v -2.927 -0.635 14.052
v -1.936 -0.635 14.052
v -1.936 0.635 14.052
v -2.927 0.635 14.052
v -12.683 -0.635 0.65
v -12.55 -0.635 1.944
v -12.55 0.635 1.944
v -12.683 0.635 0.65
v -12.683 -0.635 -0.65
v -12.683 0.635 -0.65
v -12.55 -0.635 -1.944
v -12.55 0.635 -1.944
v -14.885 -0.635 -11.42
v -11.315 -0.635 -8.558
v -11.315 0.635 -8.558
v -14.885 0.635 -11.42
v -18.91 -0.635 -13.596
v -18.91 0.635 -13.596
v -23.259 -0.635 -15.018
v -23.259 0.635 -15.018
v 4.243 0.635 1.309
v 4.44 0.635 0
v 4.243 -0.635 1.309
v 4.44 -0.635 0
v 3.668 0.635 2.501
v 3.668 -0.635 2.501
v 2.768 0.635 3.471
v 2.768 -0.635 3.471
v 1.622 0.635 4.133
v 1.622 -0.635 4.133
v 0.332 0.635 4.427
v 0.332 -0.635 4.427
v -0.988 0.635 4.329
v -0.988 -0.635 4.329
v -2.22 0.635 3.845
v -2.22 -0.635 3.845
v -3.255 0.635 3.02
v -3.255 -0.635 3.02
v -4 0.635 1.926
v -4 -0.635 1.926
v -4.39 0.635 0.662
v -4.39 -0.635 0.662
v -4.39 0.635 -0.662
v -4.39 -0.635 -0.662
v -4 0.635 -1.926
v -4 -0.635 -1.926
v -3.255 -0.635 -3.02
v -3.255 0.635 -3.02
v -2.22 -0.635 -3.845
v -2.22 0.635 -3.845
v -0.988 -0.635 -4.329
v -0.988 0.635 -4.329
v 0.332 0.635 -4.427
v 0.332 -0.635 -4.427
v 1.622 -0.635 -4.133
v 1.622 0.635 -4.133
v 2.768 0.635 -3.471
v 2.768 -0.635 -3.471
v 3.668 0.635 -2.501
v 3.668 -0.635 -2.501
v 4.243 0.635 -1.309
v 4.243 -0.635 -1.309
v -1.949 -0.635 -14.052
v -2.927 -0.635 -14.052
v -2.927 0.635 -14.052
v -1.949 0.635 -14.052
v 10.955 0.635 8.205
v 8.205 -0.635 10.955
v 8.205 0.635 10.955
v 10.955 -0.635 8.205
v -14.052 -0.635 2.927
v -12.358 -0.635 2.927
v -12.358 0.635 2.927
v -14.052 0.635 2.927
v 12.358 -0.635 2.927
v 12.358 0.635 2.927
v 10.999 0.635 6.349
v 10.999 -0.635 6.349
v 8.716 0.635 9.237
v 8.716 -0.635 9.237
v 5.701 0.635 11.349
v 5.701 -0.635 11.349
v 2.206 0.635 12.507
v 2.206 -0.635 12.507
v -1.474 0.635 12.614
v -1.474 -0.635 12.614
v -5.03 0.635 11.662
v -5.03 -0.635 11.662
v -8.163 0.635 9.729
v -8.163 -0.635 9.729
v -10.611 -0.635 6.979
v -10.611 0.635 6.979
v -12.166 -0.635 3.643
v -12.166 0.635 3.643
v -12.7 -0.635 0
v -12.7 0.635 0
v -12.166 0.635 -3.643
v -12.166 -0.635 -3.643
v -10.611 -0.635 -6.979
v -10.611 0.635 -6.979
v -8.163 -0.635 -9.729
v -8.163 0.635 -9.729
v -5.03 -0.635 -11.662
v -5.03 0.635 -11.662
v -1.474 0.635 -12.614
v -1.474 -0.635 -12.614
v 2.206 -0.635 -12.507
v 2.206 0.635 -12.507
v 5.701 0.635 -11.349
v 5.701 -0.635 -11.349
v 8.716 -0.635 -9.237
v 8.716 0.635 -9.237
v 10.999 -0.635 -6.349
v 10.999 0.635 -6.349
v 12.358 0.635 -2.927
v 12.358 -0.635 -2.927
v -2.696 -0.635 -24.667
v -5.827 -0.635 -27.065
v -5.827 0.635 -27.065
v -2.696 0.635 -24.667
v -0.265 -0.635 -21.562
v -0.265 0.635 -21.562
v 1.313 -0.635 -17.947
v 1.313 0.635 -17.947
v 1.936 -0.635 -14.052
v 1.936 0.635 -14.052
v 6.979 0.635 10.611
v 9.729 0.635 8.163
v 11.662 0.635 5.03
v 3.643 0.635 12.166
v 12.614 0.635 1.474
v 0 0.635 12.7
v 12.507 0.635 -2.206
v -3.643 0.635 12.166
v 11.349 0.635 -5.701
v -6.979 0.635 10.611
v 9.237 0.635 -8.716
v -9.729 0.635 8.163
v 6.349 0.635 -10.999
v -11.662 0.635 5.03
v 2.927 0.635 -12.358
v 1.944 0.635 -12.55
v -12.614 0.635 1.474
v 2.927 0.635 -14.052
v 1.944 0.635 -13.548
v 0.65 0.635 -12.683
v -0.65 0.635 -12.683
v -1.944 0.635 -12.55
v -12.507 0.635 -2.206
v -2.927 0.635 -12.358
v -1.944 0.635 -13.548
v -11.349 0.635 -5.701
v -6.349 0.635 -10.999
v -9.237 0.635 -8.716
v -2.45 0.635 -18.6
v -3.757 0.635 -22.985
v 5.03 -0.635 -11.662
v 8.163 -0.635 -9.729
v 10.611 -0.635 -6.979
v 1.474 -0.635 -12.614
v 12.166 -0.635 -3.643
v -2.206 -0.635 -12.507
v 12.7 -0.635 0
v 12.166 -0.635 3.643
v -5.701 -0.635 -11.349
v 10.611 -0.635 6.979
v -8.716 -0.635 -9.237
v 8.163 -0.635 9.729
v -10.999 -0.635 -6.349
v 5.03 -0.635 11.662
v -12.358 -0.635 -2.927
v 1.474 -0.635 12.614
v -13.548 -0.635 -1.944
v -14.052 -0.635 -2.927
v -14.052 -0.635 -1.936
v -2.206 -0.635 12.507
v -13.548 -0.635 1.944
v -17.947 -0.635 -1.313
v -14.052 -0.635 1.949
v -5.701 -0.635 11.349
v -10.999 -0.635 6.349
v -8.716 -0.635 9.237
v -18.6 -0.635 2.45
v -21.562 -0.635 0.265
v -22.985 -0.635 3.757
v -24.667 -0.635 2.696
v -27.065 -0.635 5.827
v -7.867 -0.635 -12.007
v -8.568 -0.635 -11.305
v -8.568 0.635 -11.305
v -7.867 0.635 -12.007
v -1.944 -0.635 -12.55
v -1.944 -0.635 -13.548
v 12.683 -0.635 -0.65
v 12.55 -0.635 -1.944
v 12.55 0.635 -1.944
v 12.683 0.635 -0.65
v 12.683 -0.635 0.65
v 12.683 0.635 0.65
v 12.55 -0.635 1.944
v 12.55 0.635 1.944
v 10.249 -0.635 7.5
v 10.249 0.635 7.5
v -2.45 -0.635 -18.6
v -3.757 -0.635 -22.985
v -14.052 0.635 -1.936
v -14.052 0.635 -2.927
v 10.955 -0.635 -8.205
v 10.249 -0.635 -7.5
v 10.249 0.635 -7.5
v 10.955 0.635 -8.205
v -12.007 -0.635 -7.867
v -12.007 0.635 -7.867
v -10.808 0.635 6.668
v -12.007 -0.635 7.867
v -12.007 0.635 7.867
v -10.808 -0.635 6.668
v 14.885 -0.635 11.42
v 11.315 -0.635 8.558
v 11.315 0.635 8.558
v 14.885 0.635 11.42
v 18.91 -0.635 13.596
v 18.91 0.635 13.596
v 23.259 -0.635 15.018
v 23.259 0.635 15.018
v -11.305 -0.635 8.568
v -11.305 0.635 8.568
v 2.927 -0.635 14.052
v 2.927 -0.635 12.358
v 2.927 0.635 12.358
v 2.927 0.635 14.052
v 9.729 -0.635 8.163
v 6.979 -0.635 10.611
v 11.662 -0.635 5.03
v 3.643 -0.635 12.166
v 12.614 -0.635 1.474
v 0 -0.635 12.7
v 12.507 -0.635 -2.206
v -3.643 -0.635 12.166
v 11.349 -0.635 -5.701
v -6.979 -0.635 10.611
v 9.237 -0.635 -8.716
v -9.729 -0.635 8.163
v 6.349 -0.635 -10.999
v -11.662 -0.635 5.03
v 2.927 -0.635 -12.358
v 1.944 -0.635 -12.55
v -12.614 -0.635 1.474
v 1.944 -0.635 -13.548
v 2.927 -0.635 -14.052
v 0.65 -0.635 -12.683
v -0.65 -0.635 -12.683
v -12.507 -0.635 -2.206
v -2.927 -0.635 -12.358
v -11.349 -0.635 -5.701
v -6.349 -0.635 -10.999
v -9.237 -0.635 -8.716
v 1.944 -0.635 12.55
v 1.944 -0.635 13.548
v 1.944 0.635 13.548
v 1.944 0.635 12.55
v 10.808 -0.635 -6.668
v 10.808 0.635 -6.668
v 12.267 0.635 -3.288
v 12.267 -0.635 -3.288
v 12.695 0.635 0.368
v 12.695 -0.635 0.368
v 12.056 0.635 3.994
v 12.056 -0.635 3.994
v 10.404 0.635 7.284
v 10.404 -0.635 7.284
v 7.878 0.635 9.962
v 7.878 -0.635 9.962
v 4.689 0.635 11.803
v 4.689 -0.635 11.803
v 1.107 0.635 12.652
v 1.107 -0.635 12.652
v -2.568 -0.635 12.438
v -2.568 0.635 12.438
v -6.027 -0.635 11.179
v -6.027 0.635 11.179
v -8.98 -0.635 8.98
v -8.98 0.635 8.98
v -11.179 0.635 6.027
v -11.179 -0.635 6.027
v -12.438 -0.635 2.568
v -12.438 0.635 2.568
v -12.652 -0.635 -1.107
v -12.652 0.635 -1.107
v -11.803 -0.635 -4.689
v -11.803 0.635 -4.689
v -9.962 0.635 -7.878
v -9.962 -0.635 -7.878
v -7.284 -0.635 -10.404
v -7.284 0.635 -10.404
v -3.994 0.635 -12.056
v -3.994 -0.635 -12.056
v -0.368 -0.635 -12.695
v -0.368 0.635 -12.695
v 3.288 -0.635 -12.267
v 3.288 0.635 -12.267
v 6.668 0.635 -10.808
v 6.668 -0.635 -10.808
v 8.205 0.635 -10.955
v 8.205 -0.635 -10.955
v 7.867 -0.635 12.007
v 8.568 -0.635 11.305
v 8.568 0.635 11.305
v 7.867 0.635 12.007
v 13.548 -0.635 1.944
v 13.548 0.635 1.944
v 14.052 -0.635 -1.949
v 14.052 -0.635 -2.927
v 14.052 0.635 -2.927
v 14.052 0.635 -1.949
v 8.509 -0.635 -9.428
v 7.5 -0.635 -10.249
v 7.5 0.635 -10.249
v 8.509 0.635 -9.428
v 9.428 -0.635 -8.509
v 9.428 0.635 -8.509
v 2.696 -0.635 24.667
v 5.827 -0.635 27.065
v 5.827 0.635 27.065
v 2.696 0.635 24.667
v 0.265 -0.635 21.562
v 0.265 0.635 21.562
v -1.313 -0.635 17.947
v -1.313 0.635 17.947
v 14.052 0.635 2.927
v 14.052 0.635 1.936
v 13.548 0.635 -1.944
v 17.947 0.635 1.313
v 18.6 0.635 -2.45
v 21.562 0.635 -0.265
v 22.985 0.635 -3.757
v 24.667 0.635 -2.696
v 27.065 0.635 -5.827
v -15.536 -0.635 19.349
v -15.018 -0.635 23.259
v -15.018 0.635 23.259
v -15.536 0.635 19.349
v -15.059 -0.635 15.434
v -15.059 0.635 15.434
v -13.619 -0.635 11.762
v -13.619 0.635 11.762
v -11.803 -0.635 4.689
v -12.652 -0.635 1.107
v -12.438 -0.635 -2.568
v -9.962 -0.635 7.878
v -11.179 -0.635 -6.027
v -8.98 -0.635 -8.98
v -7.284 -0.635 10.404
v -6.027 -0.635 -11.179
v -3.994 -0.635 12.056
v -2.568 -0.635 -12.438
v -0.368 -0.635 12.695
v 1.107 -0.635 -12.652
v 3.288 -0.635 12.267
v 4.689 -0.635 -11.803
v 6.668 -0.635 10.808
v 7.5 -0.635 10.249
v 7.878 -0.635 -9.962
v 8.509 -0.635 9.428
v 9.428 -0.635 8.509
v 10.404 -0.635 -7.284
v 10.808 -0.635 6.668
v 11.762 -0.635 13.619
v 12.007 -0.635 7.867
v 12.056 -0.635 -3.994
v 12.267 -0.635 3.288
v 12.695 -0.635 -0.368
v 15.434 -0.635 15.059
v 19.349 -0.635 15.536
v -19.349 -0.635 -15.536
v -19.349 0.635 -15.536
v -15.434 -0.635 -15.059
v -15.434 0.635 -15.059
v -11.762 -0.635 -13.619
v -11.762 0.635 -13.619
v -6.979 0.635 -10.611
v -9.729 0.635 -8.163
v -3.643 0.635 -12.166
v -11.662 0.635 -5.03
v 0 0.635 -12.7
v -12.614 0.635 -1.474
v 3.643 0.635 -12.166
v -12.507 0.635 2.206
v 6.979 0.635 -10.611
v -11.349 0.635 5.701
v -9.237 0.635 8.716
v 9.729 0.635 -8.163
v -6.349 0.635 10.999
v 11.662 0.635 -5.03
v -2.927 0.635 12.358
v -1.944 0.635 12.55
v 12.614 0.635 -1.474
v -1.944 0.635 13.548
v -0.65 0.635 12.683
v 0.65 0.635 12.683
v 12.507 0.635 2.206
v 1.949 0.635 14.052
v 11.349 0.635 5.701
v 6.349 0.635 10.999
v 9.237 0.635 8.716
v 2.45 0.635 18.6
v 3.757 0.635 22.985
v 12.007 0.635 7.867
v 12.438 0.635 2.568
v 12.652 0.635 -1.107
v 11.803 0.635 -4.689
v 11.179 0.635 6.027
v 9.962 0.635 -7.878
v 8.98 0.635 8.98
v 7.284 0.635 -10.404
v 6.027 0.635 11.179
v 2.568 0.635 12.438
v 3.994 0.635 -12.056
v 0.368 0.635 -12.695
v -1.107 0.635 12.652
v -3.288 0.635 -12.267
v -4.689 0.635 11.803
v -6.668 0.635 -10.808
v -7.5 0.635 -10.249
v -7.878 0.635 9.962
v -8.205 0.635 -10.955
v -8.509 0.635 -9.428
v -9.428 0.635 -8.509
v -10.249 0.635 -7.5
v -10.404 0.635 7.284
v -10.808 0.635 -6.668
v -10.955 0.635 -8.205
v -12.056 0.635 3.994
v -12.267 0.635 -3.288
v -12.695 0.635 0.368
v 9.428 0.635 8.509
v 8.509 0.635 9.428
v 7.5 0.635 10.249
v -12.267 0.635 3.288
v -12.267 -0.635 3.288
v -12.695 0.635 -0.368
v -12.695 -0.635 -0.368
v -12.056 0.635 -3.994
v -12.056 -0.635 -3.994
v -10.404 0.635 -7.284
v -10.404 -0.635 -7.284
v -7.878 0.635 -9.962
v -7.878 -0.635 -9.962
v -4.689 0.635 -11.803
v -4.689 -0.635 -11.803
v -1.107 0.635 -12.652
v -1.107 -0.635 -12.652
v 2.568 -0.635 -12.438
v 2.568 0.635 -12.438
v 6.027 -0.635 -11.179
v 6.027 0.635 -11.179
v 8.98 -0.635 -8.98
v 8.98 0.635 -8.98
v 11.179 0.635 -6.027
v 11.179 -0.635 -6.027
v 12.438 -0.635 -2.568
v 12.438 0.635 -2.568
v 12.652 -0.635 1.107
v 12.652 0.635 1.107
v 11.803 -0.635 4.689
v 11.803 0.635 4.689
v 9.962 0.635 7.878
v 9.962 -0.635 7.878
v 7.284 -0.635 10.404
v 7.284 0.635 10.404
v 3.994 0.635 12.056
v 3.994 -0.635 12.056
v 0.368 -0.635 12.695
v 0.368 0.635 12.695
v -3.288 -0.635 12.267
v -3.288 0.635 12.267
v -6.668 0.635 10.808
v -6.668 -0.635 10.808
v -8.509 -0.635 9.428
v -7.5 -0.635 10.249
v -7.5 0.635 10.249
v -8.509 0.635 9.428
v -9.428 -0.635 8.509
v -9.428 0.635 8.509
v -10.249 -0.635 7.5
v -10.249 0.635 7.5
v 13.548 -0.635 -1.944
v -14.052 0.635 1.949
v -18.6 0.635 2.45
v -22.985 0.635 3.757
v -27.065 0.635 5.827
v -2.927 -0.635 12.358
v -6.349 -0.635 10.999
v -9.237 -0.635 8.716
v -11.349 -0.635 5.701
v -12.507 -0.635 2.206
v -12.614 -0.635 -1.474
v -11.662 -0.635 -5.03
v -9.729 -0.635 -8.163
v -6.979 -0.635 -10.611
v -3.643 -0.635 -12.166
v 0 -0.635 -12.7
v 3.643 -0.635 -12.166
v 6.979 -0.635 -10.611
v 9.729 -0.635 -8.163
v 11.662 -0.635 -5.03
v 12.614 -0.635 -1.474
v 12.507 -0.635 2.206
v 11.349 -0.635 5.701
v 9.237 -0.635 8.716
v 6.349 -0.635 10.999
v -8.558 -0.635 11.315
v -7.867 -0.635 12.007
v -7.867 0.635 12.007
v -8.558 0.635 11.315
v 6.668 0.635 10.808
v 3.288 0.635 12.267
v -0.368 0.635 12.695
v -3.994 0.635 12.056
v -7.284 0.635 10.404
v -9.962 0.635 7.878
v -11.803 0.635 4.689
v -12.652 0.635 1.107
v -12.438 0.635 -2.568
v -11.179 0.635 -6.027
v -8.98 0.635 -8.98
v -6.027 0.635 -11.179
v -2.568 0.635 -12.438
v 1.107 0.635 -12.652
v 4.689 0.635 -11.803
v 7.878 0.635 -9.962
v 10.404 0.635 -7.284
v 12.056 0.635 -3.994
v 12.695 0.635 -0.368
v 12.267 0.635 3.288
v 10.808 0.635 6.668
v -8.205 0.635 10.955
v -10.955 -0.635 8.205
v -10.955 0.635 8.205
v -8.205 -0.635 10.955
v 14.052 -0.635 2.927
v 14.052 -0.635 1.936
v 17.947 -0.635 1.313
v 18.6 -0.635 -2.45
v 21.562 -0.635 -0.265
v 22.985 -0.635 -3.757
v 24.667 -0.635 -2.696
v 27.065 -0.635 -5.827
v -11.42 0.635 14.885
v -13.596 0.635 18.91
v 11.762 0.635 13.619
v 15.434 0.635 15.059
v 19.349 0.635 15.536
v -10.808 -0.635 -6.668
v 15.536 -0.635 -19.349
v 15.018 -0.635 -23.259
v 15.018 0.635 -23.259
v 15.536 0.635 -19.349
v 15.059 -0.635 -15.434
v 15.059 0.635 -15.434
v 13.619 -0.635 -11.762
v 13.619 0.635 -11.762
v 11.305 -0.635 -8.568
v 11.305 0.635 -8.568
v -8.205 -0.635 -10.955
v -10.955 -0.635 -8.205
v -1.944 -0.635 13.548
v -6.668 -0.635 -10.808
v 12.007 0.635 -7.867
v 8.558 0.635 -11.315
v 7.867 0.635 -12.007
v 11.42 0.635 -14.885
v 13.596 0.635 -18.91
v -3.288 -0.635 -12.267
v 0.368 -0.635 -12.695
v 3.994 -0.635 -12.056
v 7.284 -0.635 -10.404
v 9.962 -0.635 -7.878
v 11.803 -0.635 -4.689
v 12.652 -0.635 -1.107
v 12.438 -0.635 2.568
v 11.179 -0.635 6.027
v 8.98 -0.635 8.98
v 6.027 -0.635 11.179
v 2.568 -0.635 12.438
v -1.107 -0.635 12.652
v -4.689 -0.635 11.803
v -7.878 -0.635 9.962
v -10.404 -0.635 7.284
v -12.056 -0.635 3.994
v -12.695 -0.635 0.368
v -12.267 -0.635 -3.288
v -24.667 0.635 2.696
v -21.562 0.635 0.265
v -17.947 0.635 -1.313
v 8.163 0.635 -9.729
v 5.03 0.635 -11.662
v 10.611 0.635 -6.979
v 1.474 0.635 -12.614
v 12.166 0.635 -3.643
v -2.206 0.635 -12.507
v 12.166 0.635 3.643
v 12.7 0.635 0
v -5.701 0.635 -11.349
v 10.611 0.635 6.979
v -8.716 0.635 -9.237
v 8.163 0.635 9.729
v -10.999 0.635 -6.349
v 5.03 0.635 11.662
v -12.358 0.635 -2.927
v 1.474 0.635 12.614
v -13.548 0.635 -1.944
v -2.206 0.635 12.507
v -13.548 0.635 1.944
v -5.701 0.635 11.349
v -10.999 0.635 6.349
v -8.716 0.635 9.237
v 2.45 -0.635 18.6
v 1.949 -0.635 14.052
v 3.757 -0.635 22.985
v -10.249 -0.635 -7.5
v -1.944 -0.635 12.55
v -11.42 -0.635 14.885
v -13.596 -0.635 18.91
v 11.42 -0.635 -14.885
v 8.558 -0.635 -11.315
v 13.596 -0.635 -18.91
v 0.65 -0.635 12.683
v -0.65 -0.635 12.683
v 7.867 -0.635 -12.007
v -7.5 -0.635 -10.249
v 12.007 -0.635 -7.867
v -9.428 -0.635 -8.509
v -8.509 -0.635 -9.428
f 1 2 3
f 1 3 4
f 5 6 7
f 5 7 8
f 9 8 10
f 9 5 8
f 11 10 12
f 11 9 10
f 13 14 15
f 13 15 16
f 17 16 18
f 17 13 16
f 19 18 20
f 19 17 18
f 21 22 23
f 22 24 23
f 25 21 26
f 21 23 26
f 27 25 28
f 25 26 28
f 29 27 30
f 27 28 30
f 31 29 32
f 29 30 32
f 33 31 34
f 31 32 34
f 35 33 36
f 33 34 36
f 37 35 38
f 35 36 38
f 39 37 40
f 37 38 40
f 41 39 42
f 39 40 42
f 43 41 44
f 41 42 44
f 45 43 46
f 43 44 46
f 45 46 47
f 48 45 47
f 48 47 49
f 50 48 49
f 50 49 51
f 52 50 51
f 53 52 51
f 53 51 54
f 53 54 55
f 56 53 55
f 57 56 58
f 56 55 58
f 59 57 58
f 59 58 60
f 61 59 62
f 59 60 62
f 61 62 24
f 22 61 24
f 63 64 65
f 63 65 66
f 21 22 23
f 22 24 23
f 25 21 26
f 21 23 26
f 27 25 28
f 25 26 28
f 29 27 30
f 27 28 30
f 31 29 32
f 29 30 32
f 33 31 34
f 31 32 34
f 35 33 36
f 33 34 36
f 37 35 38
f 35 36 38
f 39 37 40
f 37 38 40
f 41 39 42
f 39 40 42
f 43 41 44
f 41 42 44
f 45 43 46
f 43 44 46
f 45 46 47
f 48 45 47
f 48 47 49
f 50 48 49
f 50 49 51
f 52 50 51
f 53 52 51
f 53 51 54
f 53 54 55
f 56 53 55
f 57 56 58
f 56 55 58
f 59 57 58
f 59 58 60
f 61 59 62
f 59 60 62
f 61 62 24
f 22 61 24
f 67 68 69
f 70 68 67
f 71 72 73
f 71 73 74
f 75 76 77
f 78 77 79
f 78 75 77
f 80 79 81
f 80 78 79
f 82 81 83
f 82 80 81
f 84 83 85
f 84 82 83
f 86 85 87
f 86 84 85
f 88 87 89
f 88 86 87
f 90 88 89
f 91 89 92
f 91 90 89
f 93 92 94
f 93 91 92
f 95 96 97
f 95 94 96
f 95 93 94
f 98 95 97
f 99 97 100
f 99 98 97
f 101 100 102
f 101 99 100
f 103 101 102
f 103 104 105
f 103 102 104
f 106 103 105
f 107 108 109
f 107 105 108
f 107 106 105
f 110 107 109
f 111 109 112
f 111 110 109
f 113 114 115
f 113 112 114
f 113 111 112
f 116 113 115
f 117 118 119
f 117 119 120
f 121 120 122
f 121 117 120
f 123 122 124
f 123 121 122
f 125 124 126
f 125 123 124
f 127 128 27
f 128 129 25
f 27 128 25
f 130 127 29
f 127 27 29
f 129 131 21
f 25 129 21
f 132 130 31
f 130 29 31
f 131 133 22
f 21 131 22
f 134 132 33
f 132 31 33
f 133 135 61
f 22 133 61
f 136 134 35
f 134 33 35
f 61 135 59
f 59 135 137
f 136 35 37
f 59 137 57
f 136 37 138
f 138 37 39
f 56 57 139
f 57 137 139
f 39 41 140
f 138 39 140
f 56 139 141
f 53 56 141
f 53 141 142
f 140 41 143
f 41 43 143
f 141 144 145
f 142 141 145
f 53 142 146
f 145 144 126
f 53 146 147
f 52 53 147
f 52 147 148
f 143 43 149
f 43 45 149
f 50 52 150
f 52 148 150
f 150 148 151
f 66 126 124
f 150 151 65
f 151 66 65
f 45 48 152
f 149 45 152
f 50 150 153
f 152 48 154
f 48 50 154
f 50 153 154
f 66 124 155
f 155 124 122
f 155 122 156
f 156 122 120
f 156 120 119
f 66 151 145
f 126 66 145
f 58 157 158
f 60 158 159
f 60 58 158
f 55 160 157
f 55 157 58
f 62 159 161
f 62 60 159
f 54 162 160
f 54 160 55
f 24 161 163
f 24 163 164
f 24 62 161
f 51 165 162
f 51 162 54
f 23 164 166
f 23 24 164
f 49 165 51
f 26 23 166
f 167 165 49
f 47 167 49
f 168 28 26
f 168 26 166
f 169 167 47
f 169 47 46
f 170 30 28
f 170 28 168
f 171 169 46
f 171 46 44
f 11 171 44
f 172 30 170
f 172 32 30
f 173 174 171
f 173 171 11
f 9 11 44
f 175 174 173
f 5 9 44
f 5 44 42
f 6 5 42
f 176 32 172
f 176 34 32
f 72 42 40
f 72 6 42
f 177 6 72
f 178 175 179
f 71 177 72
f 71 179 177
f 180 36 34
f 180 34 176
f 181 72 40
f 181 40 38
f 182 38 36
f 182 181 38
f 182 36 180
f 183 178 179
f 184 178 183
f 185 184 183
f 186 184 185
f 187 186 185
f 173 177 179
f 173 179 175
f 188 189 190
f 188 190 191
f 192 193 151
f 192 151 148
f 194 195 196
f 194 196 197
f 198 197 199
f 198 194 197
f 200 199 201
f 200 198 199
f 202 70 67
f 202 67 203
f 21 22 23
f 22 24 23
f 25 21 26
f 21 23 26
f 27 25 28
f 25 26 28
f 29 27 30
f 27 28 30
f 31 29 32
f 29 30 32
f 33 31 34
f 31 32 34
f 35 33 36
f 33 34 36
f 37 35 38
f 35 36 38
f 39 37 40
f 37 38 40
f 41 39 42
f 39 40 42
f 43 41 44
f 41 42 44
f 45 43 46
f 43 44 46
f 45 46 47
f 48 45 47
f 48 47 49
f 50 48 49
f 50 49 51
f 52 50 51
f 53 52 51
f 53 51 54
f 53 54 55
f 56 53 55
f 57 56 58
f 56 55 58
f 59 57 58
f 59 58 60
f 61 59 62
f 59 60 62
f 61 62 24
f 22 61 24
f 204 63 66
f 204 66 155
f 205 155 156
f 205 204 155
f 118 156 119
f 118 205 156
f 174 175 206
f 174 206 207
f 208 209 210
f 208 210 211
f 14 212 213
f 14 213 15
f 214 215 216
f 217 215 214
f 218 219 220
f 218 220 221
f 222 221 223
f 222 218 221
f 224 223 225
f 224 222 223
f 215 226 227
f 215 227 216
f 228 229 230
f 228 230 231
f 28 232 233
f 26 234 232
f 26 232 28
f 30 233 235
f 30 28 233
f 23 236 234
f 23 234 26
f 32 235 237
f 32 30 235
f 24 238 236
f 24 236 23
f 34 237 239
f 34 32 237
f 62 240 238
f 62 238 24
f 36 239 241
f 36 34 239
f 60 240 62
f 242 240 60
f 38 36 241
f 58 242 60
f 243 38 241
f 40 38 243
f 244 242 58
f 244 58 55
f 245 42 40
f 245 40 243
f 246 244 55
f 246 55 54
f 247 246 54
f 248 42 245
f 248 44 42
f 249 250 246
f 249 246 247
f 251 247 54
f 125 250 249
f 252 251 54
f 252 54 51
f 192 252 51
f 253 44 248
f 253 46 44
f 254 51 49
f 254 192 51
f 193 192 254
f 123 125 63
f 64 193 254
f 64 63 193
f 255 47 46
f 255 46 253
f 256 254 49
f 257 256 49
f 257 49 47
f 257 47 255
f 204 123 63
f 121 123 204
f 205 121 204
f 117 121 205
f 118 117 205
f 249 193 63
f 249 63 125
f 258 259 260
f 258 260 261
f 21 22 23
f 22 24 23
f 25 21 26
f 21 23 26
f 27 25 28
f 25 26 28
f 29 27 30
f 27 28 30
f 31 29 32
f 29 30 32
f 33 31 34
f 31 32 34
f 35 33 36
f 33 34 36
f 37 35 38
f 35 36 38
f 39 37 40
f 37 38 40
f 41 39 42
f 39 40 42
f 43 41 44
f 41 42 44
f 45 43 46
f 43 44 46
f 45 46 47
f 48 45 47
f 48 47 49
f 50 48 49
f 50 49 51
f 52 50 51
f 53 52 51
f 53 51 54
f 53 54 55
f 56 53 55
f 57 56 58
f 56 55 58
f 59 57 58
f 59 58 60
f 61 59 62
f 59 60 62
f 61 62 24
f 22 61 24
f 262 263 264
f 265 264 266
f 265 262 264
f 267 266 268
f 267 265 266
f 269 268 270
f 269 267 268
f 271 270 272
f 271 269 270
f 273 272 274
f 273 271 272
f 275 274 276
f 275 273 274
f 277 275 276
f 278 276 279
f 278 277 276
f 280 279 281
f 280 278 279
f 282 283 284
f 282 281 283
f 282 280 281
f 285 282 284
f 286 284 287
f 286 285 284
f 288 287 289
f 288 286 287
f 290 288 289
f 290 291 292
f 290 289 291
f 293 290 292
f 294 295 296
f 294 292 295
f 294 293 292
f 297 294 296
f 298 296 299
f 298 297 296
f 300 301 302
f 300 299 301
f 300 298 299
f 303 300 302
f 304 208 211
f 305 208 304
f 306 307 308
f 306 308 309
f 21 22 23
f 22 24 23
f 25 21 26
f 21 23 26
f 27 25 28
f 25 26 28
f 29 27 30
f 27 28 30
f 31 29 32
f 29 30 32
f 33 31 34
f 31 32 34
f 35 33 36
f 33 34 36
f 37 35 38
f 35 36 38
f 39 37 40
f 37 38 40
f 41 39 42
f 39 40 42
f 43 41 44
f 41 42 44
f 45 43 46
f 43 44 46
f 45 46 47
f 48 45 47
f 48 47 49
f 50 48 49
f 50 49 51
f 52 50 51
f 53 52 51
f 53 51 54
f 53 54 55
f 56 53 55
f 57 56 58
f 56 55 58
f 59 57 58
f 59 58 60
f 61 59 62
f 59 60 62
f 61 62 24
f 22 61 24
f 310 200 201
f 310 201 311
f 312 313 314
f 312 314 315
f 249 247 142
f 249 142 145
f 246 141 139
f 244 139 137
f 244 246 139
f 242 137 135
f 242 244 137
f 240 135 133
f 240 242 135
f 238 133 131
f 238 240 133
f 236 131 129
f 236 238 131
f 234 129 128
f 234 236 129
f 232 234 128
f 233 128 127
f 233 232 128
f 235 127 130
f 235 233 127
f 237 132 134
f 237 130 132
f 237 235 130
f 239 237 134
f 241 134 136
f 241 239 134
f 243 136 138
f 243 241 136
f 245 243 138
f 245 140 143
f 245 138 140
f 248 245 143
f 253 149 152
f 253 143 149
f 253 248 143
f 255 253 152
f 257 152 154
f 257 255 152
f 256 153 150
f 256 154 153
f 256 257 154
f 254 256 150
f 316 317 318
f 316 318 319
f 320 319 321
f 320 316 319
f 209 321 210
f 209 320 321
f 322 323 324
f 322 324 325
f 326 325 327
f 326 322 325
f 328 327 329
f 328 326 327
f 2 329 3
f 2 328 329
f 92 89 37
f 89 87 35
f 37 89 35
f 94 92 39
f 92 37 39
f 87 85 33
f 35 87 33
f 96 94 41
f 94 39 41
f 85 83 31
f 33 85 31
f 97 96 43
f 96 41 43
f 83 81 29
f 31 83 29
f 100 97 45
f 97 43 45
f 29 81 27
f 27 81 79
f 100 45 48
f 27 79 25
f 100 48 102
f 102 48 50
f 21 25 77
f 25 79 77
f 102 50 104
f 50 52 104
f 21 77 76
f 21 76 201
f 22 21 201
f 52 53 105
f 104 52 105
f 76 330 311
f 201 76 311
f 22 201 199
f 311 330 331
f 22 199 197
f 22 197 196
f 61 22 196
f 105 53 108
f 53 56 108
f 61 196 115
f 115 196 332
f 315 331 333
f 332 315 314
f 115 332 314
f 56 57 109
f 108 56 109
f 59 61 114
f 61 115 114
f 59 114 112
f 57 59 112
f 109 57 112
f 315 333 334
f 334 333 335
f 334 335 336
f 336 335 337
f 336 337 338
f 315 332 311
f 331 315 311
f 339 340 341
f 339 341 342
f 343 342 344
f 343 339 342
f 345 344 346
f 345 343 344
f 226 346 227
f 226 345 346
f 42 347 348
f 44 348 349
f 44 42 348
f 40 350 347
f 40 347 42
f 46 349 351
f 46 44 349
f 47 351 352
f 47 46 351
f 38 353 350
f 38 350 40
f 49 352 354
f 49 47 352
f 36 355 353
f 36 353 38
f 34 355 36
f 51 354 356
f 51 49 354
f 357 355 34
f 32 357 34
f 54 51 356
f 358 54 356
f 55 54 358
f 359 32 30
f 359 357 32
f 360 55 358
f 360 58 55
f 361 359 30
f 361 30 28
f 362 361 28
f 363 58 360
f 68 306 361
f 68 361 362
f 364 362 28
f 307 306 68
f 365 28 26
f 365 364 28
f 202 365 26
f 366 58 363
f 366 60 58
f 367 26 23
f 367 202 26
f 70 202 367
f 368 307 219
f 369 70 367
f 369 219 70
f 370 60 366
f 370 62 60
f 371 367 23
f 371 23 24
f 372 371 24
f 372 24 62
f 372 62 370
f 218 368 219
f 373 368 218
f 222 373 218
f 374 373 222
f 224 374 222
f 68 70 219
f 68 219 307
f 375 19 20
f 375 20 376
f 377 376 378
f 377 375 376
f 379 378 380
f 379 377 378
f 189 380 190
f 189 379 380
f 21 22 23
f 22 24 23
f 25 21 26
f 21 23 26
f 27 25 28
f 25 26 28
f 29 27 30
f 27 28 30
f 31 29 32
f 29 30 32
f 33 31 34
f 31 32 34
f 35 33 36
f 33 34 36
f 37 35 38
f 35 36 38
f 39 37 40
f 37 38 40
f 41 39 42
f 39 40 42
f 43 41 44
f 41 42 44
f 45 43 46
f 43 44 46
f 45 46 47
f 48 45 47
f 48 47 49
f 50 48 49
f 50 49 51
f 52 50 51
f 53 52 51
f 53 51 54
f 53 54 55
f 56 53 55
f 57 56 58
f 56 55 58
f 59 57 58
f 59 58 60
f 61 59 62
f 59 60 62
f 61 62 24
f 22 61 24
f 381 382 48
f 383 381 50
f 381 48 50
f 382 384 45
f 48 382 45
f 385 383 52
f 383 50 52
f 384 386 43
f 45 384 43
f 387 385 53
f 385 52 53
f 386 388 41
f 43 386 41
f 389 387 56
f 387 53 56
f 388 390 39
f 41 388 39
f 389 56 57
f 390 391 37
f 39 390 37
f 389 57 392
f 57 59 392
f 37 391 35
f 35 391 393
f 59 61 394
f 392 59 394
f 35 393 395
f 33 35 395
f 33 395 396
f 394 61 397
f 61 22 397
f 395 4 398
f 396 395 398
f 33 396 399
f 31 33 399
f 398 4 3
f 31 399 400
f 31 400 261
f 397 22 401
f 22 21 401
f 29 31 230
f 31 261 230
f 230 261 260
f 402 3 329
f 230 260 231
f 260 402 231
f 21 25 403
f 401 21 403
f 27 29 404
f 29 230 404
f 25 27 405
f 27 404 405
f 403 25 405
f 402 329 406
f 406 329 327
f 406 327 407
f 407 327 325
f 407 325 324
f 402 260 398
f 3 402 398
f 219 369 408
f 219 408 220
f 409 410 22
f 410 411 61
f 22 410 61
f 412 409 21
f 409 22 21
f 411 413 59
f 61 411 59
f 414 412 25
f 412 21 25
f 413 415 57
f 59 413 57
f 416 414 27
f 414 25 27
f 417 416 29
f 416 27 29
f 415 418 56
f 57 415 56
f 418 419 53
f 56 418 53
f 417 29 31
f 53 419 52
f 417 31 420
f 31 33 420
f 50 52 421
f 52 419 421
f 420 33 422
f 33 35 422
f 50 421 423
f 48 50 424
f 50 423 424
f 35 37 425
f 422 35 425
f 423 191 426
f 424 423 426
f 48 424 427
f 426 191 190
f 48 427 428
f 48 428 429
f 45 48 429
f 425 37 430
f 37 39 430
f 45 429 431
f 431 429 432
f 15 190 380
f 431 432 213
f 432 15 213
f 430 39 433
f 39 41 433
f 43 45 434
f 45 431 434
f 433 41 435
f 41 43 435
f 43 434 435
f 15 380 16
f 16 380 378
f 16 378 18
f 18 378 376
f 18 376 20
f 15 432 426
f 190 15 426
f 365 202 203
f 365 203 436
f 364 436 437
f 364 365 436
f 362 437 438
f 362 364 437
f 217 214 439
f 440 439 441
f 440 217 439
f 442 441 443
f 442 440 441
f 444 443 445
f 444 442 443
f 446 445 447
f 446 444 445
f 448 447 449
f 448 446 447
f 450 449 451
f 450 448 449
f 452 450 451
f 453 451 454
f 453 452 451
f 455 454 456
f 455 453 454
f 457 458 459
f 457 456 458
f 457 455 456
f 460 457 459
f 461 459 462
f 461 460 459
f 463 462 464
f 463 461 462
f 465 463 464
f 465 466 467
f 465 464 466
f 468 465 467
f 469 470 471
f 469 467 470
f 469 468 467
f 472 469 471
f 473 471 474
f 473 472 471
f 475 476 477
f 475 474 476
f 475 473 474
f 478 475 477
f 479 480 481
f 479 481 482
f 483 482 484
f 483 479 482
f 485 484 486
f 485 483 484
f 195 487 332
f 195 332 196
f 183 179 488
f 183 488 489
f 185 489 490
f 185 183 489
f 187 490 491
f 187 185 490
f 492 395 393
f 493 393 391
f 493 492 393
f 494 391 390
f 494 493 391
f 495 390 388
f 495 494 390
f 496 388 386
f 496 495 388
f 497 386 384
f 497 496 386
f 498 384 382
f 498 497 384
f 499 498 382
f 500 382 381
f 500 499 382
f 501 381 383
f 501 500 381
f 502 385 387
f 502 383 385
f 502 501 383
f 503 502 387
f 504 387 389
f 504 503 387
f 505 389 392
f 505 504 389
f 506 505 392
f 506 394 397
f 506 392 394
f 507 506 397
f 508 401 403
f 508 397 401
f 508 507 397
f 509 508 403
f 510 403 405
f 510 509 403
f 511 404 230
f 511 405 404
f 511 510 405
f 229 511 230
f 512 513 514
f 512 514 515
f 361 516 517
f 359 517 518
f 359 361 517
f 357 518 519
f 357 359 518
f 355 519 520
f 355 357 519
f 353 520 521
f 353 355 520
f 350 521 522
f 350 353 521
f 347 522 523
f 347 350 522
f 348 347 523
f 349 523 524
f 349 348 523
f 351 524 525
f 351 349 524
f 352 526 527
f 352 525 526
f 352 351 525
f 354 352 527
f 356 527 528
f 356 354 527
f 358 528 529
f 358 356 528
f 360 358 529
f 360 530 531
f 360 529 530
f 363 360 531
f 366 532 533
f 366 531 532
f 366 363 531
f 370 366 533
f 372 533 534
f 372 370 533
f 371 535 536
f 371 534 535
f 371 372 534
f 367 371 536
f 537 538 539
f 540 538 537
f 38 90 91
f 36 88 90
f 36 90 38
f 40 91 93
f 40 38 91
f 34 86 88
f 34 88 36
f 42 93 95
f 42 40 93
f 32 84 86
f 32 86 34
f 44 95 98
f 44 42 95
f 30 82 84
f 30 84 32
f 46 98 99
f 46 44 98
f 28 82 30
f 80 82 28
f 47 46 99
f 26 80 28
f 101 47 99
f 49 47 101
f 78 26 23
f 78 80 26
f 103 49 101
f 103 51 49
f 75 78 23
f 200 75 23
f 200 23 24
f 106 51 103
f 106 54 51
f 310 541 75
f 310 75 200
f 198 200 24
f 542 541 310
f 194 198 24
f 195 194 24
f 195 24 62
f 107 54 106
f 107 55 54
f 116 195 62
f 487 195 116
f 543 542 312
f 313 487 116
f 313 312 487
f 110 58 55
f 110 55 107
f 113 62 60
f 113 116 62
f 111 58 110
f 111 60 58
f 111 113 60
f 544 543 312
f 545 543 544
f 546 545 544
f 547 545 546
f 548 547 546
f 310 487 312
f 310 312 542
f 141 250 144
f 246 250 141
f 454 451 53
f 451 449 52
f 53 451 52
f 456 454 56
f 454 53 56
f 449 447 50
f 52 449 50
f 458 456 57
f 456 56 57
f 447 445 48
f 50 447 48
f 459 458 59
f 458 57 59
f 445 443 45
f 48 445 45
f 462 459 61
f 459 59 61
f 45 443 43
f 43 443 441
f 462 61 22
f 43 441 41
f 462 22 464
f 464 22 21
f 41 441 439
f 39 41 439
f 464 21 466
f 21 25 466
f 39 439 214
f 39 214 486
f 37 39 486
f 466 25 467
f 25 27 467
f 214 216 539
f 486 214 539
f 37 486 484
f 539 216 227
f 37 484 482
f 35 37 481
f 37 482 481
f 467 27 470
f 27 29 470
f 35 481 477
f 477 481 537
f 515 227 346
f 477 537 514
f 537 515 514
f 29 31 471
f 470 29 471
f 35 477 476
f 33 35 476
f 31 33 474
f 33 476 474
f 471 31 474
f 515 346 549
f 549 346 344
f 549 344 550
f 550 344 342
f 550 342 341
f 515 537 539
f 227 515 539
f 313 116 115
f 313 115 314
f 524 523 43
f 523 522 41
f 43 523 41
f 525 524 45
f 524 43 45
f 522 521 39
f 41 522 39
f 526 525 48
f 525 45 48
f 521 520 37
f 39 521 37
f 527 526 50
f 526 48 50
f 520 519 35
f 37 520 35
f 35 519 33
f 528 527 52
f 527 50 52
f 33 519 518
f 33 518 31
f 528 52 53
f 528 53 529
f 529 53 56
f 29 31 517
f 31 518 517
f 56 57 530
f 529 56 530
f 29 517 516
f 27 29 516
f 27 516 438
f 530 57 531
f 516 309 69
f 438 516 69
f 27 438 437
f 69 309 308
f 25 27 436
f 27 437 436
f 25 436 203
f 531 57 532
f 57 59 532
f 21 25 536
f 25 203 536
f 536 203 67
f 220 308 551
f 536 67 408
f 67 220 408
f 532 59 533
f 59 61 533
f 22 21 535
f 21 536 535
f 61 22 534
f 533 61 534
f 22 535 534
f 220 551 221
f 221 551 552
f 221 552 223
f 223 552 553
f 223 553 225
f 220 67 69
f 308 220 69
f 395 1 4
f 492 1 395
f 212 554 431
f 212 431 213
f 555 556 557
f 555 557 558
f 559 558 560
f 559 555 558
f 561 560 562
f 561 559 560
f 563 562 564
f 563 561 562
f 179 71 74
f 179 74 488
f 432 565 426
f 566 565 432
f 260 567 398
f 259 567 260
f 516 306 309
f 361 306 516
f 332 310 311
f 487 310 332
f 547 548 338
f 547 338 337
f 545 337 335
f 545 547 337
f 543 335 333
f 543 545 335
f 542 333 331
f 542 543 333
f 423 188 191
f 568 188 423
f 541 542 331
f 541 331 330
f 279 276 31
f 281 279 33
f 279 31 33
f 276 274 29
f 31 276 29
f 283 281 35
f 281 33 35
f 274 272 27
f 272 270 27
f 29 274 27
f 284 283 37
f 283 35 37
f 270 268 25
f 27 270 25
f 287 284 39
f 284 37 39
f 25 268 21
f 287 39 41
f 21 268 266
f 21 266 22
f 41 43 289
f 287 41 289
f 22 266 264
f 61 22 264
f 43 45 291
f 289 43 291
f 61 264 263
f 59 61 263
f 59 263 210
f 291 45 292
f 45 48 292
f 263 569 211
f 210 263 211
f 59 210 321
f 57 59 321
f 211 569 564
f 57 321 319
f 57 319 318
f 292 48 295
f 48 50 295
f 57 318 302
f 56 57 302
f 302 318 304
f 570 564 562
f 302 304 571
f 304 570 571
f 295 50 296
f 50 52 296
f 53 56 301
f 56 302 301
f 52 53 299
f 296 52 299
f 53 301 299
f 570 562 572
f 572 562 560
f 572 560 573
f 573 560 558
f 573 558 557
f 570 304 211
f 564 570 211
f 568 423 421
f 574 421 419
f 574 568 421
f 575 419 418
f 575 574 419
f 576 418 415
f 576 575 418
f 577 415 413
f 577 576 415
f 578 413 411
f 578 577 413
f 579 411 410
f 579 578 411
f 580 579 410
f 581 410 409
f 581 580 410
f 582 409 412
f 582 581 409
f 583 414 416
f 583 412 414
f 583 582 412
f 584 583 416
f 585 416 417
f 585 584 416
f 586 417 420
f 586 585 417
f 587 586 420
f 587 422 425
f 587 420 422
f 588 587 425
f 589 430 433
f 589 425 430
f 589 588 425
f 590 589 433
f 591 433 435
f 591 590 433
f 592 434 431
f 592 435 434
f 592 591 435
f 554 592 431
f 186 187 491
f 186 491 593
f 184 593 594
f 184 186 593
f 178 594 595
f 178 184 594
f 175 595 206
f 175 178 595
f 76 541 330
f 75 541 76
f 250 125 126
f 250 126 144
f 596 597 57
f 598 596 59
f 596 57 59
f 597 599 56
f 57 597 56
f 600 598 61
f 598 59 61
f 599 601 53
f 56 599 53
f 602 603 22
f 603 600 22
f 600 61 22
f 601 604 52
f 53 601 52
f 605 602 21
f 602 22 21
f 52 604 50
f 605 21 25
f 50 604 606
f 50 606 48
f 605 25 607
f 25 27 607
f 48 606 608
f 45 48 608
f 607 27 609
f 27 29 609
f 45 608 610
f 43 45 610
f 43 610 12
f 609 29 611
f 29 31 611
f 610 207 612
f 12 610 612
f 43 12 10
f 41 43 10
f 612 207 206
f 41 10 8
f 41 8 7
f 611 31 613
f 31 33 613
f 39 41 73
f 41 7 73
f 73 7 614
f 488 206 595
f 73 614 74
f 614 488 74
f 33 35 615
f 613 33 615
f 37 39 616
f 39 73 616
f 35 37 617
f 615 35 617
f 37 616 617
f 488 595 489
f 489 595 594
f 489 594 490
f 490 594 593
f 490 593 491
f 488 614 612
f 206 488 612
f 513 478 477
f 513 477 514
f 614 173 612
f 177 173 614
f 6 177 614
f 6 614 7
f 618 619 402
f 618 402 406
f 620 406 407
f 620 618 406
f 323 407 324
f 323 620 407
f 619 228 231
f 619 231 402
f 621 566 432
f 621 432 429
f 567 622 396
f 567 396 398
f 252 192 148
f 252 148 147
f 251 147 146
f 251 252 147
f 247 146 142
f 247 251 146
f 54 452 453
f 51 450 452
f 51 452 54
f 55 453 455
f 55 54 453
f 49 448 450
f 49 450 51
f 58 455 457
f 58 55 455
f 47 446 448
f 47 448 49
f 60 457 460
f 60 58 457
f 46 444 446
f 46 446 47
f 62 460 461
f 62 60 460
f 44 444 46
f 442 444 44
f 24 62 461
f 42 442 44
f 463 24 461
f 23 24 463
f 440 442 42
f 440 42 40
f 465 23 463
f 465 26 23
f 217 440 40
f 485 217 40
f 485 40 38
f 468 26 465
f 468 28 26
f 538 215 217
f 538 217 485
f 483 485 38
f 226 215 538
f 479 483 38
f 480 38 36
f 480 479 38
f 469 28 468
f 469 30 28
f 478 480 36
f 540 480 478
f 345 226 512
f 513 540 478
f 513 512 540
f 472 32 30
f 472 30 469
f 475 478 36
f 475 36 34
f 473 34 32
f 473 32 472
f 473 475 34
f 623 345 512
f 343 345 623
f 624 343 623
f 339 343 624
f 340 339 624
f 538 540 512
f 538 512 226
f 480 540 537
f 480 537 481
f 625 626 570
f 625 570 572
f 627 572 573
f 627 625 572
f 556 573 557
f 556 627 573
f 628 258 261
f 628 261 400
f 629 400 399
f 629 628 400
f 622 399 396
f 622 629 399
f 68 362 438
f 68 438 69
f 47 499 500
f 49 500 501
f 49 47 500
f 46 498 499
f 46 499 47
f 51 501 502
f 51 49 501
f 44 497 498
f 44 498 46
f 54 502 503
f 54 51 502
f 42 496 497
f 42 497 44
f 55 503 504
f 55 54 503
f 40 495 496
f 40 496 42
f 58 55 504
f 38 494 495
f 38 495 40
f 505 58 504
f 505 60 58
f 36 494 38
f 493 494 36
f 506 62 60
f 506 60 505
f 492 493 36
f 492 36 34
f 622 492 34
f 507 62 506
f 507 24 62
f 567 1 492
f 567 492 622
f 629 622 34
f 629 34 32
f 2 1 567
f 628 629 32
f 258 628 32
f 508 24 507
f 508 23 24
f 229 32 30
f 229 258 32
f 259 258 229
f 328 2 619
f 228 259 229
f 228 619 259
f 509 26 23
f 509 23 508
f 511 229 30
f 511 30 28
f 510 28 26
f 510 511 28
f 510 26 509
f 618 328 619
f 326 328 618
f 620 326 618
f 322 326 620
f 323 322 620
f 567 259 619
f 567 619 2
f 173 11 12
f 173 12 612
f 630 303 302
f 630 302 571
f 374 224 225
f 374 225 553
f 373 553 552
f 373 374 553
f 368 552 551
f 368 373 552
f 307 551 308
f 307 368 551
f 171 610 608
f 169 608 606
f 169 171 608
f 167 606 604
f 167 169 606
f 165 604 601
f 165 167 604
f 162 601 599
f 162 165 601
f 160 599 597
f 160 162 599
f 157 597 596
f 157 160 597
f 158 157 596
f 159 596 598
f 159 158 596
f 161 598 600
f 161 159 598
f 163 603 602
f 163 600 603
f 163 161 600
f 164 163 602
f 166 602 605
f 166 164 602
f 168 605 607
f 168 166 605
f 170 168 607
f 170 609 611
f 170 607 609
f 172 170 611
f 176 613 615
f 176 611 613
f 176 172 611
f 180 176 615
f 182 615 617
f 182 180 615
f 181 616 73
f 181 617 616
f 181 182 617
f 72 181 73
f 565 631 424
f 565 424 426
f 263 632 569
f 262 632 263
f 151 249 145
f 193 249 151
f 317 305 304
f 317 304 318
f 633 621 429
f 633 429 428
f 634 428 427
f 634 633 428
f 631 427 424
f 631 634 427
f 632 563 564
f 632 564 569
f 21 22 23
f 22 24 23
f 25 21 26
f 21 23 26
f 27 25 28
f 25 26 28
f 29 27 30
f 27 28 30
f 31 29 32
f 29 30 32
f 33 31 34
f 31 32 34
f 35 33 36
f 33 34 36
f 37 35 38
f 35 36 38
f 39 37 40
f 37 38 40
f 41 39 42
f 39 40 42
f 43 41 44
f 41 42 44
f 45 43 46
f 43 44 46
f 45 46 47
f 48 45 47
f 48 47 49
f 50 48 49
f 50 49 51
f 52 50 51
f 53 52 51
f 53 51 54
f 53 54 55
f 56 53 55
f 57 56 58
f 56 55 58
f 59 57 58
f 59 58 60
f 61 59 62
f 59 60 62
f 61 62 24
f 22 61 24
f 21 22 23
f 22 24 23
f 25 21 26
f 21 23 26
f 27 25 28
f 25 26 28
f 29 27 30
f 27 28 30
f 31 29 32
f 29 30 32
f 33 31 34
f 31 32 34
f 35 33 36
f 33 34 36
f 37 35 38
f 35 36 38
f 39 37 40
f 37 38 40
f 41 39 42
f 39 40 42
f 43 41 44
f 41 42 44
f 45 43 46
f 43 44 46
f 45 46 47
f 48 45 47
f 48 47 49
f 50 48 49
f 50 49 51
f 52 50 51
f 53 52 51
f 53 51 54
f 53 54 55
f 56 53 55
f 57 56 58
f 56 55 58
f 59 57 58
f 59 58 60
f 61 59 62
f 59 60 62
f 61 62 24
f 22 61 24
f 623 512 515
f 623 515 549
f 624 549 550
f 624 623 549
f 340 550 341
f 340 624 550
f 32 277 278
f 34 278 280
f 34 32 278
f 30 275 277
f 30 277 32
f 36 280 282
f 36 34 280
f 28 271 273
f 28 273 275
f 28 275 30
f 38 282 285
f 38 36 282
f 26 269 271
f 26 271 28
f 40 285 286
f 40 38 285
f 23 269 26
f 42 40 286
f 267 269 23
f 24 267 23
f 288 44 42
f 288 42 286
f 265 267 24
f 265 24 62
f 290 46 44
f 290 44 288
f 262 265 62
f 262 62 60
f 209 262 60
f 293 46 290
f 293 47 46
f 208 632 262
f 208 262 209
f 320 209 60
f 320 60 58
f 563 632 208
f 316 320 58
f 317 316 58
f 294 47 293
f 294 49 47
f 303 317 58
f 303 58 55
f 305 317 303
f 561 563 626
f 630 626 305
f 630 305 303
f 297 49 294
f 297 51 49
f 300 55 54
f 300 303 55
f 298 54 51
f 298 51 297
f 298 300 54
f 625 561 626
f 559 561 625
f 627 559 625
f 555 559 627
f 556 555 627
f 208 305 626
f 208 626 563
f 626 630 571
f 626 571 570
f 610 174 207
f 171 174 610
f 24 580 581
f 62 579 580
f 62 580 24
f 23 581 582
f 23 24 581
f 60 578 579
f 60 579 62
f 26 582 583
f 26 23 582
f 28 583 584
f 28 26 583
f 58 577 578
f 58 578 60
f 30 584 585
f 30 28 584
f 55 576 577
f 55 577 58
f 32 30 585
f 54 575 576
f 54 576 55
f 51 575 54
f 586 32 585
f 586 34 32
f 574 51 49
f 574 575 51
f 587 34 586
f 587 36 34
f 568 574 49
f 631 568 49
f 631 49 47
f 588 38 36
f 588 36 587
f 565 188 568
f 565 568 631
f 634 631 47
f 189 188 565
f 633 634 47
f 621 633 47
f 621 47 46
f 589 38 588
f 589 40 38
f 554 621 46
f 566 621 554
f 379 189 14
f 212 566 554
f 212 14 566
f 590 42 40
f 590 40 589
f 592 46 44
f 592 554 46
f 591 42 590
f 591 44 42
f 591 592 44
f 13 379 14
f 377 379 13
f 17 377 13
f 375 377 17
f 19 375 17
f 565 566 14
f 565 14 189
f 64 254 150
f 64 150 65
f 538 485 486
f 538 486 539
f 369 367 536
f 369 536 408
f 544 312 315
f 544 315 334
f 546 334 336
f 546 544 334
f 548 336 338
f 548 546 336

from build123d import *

# Parameters (mm, degrees)
F0_R     = 12.7
F1_DEPTH = 0.635
F3_DEPTH = 0.635
F4_COUNT = 8
F5_R     = 4.439905228
F6_DEPTH = 0.635


with BuildPart() as f1:
    # F0 (on Front) → F1 (new body, symmetric)
    with BuildSketch(Plane.XZ):
        Circle(F0_R)
    extrude(amount=F1_DEPTH, both=True)

    # F2 (on Front) → F3 (join, symmetric)
    with BuildSketch(Plane.XZ):
        with BuildLine():
            ThreePointArc((1.9490664869, 14.0524301678), (1.9453203714, 13.800252346), (1.9440716254, 13.5480497929))
            Line((1.9440716254, 13.5480497929), (1.9440716254, 11.2103040365))
            Line((1.9440716254, 11.2103040365), (-1.9440716254, 11.2103040365))
            Line((-1.9440716254, 11.2103040365), (-1.9440716254, 13.5480497929))
            ThreePointArc((-1.9440716254, 13.5480497929), (-1.9420379436, 13.8002727735), (-1.9359374271, 14.0524301678))
            Line((-1.9359374271, 14.0524301678), (-2.9274336994, 14.0524301678))
            Line((-2.9274336994, 14.0524301678), (-2.9274336994, 10.7059236616))
            Line((-2.9274336994, 10.7059236616), (2.9274336994, 10.7059236616))
            Line((2.9274336994, 10.7059236616), (2.9274336994, 14.0524301678))
            Line((2.9274336994, 14.0524301678), (1.9490664869, 14.0524301678))
        make_face()
        with BuildLine():
            Line((-1.9440716254, 13.5480497929), (1.9440716254, 13.5480497929))
            ThreePointArc((1.9440716254, 13.5480497929), (1.9453203714, 13.800252346), (1.9490664869, 14.0524301678))
            Line((1.9490664869, 14.0524301678), (-1.9359374271, 14.0524301678))
            ThreePointArc((-1.9359374271, 14.0524301678), (-1.9420379436, 13.8002727735), (-1.9440716254, 13.5480497929))
        make_face()
        with BuildLine():
            Line((-1.9359374271, 14.0524301678), (1.9490664869, 14.0524301678))
            ThreePointArc((1.9490664869, 14.0524301678), (3.0049526679, 20.8221748276), (5.8272827847, 27.0654745239))
            ThreePointArc((5.8272827847, 27.0654745239), (0.2647127685, 21.5617662603), (-1.9359374271, 14.0524301678))
        make_face()
    extrude(amount=F3_DEPTH, both=True)


with BuildPart() as f4_1:
    # F4: instance of F1
    add(f1.part.rotate(Axis((0, 0, 0), (0, -1, 0)), 1 * 360 / F4_COUNT))


with BuildPart() as f4_2:
    # F4: instance of F1
    add(f1.part.rotate(Axis((0, 0, 0), (0, -1, 0)), 2 * 360 / F4_COUNT))


with BuildPart() as f4_3:
    # F4: instance of F1
    add(f1.part.rotate(Axis((0, 0, 0), (0, -1, 0)), 3 * 360 / F4_COUNT))


with BuildPart() as f4_4:
    # F4: instance of F1
    add(f1.part.rotate(Axis((0, 0, 0), (0, -1, 0)), 4 * 360 / F4_COUNT))


with BuildPart() as f4_5:
    # F4: instance of F1
    add(f1.part.rotate(Axis((0, 0, 0), (0, -1, 0)), 5 * 360 / F4_COUNT))


with BuildPart() as f4_6:
    # F4: instance of F1
    add(f1.part.rotate(Axis((0, 0, 0), (0, -1, 0)), 6 * 360 / F4_COUNT))


with BuildPart() as f4_7:
    # F4: instance of F1
    add(f1.part.rotate(Axis((0, 0, 0), (0, -1, 0)), 7 * 360 / F4_COUNT))


with BuildPart() as f6_tool:
    # F5 (on Front) → F6 (new body, symmetric)
    with BuildSketch(Plane.XZ):
        Circle(F5_R)
    extrude(amount=F6_DEPTH, both=True)


with BuildPart() as f1_1:
    add(f1.part)

    # F6: cut by f6_tool
    add(f6_tool.part, mode=Mode.SUBTRACT)


with BuildPart() as f4_1_1:
    add(f4_1.part)

    # F6: cut by f6_tool
    add(f6_tool.part, mode=Mode.SUBTRACT)


with BuildPart() as f4_2_1:
    add(f4_2.part)

    # F6: cut by f6_tool
    add(f6_tool.part, mode=Mode.SUBTRACT)


with BuildPart() as f4_3_1:
    add(f4_3.part)

    # F6: cut by f6_tool
    add(f6_tool.part, mode=Mode.SUBTRACT)


with BuildPart() as f4_4_1:
    add(f4_4.part)

    # F6: cut by f6_tool
    add(f6_tool.part, mode=Mode.SUBTRACT)


with BuildPart() as f4_5_1:
    add(f4_5.part)

    # F6: cut by f6_tool
    add(f6_tool.part, mode=Mode.SUBTRACT)


with BuildPart() as f4_6_1:
    add(f4_6.part)

    # F6: cut by f6_tool
    add(f6_tool.part, mode=Mode.SUBTRACT)


with BuildPart() as f4_7_1:
    add(f4_7.part)

    # F6: cut by f6_tool
    add(f6_tool.part, mode=Mode.SUBTRACT)


solid = Compound([f1_1.part, f4_1_1.part, f4_2_1.part, f4_3_1.part, f4_4_1.part, f4_5_1.part, f4_6_1.part, f4_7_1.part])
